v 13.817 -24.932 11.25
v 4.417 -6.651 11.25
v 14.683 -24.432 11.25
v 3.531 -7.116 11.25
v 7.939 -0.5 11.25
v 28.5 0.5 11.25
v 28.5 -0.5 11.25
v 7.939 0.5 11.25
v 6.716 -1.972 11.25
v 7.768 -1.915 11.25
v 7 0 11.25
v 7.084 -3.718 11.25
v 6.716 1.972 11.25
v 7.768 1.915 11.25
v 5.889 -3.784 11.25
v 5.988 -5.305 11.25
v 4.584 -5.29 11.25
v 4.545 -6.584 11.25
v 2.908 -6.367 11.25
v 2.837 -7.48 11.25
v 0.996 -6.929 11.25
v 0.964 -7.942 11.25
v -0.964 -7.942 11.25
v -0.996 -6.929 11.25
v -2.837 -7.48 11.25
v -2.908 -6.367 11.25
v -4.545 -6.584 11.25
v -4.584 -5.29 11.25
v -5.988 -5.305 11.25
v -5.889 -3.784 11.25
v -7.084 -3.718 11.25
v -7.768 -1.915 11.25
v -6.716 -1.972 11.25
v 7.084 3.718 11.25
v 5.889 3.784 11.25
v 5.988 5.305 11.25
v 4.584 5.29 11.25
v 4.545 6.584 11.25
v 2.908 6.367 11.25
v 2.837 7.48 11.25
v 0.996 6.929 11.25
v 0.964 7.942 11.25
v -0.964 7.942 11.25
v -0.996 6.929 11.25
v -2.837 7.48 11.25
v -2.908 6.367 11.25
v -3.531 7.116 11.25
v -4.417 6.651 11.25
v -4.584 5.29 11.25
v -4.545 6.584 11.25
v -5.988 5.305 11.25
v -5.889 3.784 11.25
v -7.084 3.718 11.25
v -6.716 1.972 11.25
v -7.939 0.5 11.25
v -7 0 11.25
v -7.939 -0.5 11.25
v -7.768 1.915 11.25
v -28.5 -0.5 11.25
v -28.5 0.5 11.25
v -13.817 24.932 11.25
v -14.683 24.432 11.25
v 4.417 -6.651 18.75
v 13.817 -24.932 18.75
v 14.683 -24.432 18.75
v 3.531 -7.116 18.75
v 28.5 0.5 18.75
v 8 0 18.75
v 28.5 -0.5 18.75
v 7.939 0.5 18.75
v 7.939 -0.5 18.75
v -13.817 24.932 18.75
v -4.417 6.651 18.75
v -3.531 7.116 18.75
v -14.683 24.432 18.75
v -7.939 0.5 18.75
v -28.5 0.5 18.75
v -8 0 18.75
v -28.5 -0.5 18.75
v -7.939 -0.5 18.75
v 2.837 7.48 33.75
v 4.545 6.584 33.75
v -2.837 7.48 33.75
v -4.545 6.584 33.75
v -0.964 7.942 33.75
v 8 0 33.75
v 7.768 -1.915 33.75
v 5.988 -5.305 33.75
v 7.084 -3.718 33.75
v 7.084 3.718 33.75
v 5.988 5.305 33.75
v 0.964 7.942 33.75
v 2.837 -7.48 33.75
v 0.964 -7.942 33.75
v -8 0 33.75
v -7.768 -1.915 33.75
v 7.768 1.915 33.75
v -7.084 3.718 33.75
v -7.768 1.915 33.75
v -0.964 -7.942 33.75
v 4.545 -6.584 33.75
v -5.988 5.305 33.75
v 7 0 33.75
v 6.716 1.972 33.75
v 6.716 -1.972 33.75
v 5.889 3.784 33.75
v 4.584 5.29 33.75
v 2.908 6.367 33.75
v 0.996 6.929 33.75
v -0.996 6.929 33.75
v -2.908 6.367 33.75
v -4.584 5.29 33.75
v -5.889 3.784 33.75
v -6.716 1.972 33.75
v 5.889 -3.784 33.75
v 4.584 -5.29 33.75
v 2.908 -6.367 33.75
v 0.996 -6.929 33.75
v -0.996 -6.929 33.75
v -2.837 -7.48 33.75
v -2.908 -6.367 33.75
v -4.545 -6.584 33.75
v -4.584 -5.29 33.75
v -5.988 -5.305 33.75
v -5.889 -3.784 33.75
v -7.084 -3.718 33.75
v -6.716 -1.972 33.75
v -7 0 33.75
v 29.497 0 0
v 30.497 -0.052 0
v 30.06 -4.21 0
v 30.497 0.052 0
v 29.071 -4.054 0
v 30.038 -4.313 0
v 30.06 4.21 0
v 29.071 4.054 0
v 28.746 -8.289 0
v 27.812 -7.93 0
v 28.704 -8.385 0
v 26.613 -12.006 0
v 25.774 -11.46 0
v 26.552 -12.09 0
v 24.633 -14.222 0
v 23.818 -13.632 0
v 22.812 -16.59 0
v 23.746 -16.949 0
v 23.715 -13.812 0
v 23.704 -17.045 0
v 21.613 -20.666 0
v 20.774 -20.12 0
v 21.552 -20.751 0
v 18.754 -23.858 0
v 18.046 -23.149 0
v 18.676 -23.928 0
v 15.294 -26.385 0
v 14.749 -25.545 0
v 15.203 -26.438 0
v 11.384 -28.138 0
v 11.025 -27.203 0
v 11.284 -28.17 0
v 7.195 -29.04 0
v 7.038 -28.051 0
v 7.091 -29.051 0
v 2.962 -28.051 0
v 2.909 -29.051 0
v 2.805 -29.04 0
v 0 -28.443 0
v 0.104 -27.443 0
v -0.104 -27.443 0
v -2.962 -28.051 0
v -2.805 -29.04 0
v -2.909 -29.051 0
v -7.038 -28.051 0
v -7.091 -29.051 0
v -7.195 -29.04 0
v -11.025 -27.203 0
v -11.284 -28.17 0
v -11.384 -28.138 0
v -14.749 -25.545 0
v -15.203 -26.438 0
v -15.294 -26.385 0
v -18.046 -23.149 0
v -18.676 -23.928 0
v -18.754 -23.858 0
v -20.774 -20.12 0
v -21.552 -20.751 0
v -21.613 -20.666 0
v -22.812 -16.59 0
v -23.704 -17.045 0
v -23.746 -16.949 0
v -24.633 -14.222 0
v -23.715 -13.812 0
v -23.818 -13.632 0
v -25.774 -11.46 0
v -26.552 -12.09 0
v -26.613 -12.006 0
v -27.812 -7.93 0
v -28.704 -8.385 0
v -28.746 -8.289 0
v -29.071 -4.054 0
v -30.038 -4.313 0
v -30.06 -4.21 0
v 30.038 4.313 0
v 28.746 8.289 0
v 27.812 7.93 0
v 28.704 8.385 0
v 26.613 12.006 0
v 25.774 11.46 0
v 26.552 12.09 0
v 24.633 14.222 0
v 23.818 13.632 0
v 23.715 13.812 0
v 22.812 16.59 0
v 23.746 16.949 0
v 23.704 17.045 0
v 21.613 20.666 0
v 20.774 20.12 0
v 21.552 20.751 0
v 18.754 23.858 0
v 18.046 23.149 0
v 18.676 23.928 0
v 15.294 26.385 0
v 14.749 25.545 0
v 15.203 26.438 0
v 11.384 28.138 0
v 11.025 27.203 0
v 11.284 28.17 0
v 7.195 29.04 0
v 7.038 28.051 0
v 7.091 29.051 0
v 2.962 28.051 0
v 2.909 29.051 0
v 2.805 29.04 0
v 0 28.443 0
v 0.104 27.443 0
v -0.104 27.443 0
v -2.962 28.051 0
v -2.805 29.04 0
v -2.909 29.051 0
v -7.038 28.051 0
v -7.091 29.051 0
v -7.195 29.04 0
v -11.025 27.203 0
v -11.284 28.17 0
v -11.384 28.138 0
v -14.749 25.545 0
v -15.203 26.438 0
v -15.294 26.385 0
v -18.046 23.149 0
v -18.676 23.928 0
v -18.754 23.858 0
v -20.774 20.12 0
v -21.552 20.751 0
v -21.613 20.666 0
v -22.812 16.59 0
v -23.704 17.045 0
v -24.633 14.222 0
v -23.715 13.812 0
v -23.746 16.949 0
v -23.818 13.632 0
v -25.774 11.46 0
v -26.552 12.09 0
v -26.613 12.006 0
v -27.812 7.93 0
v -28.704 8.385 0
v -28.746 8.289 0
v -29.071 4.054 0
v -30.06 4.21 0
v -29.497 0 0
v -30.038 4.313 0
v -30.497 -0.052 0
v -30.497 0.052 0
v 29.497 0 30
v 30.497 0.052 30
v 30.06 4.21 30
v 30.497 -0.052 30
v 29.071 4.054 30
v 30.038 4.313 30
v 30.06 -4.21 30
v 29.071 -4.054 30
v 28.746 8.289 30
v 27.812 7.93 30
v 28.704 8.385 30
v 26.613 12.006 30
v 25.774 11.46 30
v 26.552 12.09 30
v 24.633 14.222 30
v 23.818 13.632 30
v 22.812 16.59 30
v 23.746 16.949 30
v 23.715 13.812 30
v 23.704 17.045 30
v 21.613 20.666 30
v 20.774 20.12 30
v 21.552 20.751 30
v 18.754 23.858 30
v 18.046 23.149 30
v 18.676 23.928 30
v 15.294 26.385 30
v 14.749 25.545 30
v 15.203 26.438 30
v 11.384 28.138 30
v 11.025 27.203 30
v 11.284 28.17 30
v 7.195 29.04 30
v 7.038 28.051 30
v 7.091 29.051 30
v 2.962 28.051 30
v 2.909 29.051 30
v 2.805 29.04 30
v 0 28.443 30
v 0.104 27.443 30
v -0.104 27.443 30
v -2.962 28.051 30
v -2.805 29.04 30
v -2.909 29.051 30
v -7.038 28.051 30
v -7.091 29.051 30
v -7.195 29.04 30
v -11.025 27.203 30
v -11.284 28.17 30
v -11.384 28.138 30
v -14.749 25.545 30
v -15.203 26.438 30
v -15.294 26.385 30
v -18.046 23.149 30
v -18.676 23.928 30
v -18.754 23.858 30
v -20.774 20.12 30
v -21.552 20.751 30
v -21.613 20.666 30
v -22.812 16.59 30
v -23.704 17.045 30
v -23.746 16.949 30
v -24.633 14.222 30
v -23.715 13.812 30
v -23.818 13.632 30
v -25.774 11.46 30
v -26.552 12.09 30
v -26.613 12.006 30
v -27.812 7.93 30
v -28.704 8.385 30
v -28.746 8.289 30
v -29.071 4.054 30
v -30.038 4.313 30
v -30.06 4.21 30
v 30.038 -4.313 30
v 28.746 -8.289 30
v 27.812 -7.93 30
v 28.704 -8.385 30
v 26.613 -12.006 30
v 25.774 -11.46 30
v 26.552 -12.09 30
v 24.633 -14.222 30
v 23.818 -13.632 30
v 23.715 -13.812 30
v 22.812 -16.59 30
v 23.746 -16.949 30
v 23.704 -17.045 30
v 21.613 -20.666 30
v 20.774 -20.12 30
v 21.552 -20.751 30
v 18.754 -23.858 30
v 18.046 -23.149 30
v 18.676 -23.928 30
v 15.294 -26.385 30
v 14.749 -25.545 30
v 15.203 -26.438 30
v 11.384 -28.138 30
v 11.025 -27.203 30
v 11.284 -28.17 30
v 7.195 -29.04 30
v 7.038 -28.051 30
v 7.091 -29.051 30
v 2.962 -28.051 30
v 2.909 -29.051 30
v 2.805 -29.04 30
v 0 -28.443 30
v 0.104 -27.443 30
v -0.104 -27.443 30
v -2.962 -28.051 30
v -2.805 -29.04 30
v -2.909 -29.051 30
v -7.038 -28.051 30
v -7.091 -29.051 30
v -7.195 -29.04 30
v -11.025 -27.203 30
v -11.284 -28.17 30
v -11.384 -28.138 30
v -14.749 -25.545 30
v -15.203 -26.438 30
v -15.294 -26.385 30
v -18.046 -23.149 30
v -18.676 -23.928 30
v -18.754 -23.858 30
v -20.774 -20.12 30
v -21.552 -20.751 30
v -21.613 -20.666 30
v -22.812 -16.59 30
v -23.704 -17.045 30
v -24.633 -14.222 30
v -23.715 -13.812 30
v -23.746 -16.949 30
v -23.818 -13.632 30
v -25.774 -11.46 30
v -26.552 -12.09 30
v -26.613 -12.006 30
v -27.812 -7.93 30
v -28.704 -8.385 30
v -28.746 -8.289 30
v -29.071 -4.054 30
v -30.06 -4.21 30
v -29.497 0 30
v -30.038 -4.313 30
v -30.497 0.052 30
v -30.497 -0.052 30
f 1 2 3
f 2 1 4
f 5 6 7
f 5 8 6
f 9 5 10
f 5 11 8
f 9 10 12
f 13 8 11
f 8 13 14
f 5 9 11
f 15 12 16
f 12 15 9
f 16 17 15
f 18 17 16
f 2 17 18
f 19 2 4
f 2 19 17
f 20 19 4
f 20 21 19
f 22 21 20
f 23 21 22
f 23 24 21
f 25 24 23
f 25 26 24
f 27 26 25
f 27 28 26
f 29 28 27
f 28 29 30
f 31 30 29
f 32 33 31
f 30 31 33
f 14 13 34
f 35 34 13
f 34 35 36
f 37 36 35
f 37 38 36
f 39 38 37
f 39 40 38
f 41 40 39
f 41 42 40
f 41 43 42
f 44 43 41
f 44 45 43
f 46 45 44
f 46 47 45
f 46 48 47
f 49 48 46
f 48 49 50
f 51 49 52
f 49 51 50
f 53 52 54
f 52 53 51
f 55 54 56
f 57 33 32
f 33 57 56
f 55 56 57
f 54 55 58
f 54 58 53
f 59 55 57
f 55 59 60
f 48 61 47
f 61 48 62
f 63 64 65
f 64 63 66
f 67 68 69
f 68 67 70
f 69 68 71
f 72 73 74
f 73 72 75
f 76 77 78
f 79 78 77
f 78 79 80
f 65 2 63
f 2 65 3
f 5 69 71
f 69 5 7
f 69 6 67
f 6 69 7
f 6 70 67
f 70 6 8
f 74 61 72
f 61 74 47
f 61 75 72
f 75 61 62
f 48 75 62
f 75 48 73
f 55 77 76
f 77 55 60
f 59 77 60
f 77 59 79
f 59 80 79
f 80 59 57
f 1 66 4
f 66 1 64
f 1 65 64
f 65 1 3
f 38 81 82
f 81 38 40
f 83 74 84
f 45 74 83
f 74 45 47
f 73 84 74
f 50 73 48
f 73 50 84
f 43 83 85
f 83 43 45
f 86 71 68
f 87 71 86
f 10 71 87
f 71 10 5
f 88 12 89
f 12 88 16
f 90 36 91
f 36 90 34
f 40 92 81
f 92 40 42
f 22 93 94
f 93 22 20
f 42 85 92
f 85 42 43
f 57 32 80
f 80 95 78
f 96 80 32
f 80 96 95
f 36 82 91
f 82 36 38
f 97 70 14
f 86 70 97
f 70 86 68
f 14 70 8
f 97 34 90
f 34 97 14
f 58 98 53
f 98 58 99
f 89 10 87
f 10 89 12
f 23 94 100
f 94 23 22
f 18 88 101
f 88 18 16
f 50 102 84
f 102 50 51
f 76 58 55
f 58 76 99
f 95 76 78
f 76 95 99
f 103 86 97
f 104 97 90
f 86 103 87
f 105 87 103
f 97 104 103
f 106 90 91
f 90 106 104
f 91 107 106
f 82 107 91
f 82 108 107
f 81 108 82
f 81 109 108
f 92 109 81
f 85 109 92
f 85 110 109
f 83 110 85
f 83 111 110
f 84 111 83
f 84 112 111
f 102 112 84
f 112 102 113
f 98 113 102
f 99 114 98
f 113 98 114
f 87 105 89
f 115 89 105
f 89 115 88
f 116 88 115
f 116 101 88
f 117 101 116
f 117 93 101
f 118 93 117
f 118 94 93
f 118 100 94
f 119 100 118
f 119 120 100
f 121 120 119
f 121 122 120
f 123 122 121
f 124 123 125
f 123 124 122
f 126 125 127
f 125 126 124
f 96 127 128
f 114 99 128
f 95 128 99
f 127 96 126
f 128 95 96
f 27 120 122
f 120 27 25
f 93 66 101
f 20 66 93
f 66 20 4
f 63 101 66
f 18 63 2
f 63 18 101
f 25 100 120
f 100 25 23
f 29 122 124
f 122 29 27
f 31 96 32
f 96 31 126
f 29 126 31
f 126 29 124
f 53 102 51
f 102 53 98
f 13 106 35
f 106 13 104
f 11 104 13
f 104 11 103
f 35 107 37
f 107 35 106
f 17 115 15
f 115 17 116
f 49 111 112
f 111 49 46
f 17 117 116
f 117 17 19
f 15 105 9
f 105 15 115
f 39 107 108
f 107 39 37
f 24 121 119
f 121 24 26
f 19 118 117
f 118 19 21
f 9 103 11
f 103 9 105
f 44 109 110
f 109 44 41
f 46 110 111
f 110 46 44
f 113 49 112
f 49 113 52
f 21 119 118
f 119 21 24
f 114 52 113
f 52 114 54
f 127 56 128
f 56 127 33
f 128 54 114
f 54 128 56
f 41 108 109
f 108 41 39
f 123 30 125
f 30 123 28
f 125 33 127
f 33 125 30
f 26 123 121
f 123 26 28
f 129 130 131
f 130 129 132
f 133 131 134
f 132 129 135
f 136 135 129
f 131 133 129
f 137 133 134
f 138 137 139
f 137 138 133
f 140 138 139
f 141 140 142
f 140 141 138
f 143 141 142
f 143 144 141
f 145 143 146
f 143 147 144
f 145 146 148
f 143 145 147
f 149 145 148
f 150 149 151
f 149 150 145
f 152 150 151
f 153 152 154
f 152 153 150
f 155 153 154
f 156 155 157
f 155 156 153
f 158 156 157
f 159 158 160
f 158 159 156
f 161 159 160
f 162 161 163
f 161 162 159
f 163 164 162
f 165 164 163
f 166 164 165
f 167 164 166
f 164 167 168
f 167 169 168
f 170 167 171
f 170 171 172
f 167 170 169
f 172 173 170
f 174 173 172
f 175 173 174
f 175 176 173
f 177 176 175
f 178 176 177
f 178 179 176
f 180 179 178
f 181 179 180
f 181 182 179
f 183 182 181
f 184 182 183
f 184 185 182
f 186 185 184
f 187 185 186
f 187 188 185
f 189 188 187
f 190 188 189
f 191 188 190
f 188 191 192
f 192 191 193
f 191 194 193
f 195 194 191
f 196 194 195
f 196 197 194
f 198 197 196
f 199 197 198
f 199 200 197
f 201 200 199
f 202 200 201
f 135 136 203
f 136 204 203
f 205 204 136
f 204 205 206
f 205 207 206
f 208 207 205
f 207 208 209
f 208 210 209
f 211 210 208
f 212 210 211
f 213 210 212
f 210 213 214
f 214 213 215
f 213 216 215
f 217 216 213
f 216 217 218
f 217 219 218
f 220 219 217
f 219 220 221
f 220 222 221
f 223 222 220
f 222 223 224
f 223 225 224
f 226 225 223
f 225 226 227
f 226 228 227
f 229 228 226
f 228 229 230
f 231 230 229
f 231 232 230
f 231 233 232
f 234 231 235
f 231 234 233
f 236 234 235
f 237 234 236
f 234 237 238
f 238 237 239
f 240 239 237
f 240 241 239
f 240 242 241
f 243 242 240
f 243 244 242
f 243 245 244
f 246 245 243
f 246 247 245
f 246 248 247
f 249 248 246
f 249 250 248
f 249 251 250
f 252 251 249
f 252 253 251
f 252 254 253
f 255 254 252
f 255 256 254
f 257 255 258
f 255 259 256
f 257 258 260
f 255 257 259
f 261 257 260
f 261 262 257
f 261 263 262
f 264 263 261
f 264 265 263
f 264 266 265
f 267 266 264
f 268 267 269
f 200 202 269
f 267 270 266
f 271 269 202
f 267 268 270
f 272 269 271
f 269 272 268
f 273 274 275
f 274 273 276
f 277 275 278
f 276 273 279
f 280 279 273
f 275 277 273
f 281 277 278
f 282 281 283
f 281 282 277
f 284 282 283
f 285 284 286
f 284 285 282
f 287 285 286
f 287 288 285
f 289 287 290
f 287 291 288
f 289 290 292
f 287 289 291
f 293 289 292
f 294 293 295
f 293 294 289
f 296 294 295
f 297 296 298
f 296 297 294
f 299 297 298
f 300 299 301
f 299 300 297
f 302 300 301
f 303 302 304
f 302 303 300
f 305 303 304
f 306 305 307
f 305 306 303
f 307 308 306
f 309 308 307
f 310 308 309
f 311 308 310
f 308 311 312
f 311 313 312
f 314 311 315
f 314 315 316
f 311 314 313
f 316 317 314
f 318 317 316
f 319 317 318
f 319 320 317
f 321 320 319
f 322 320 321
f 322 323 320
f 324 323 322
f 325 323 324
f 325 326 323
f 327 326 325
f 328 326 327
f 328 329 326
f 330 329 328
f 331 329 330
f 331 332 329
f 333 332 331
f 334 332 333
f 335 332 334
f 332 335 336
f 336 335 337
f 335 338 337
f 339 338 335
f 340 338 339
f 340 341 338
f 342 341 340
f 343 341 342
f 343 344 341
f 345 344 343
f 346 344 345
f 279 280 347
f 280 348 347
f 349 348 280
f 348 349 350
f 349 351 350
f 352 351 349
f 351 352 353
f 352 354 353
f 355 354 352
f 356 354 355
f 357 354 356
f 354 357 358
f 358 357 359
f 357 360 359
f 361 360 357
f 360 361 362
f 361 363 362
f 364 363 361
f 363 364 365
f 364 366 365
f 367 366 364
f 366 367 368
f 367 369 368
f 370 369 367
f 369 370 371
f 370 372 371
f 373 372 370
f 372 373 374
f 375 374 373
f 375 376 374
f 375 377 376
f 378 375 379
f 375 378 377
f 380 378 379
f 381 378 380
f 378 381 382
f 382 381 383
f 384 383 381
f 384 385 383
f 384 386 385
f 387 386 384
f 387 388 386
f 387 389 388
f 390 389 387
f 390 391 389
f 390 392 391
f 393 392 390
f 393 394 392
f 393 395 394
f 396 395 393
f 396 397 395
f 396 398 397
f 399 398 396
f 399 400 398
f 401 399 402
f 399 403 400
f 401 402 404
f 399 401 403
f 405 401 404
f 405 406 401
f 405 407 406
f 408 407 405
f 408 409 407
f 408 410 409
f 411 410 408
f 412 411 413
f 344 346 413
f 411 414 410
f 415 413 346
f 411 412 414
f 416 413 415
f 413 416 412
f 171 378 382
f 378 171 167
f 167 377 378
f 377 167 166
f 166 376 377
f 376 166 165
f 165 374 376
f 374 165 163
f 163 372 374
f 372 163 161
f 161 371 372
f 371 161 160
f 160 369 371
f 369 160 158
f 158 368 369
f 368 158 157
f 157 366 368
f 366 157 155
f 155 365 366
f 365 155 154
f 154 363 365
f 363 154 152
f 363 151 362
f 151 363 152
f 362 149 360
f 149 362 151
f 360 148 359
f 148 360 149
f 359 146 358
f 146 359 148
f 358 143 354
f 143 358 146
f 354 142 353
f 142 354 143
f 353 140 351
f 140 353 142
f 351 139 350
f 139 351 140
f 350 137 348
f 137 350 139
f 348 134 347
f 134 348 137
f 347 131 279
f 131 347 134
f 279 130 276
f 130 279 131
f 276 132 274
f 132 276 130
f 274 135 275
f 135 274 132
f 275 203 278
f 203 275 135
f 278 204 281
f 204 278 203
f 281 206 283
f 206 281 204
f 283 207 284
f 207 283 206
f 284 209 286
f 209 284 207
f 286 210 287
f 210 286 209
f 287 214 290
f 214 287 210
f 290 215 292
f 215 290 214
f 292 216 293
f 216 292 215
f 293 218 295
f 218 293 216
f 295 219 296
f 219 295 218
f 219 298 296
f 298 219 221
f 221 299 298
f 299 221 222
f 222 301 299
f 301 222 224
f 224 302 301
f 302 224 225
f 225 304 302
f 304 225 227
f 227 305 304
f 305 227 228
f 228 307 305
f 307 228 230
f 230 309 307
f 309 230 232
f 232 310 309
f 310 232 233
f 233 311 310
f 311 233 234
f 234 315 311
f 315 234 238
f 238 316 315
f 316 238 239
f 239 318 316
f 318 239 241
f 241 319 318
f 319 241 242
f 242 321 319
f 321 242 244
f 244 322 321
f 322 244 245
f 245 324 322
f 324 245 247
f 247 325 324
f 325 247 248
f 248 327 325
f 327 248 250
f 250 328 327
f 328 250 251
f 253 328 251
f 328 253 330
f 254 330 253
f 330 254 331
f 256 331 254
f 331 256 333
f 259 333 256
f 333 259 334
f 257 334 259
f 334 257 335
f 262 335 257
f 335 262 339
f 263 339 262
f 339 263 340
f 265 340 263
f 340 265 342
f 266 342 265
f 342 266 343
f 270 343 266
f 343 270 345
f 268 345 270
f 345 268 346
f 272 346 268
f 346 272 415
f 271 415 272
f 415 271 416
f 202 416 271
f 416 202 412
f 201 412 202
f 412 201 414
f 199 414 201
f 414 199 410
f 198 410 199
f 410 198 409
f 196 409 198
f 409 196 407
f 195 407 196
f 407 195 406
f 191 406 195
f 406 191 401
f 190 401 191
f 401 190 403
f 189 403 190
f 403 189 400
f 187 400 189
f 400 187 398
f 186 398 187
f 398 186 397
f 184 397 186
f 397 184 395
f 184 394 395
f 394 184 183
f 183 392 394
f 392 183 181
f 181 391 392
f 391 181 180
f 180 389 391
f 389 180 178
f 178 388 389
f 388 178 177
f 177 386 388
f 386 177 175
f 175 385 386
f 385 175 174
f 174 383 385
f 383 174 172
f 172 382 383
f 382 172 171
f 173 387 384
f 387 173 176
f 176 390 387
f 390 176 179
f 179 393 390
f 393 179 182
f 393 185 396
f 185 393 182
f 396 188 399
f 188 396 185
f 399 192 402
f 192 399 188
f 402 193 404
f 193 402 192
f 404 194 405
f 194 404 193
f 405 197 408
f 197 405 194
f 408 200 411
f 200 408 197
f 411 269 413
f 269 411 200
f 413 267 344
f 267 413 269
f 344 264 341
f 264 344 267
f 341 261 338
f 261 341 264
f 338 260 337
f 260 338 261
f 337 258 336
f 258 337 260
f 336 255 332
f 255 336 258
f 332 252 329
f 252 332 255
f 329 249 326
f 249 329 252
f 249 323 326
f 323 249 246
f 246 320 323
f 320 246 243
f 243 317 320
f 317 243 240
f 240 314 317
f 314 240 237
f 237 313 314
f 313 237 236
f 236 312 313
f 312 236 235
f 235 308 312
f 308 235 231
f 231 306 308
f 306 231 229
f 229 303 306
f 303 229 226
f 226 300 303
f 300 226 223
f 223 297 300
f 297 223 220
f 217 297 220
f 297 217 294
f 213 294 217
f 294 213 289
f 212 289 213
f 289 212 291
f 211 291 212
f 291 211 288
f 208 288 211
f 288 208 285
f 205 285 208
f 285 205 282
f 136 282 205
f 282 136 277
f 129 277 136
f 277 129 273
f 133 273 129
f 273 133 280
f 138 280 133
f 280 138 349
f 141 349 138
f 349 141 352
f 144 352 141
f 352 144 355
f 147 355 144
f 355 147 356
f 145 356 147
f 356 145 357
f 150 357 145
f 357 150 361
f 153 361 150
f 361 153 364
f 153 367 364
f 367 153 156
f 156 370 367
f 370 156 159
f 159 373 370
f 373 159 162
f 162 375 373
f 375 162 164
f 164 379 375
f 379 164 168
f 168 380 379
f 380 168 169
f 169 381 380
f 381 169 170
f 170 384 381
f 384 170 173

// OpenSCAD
module flower(size=10, expand=20) {
    circle(expand);
    translate(v = [expand,0,0]) circle(size);
    rotate(a = [0, 0, 60]) translate(v = [expand,0,0]) circle(size);
    rotate(a = [0, 0, 120]) translate(v = [expand,0,0]) circle(size);
    rotate(a = [0, 0, 180]) translate(v = [expand,0,0]) circle(size);
    rotate(a = [0, 0, 240]) translate(v = [expand,0,0]) circle(size);
    rotate(a = [0, 0, 300]) translate(v = [expand,0,0]) circle(size);
}

module mold(thickness = 1, radius = 10, expend = 20) {
    difference() {
        offset(r=thickness/2) {
            flower(20, radius, expand);
        };
        offset(r=-thickness/2) {
            flower(20, radius, expand);
        };
    };
}

height = 30;
factor = 1.8;
length = 57;
thickness = 1;

radius = length / ( 2 * (1 + factor) );
expand = radius * factor;
h = height / 4;

linear_extrude(height = height) {
    mold();
};

difference() {
    translate(v = [0,0,height / 2 - h / 2]) {
        linear_extrude(height = height/4) {
            rotate(a = [0, 0, 30]) {
                square(size = [ thickness, 2 * (radius + expand) ], center = true);
            };
            rotate(a = [0, 0, 90]) {
                square(size = [ thickness, 2 * (radius + expand) ], center = true);
            };
        };
        cylinder(h = height / 2 + h , r1 = 8, r2 = 8);
    };
    cylinder(h = height * 2, r1 = 8 - thickness, r2 = 8 - thickness);
};
